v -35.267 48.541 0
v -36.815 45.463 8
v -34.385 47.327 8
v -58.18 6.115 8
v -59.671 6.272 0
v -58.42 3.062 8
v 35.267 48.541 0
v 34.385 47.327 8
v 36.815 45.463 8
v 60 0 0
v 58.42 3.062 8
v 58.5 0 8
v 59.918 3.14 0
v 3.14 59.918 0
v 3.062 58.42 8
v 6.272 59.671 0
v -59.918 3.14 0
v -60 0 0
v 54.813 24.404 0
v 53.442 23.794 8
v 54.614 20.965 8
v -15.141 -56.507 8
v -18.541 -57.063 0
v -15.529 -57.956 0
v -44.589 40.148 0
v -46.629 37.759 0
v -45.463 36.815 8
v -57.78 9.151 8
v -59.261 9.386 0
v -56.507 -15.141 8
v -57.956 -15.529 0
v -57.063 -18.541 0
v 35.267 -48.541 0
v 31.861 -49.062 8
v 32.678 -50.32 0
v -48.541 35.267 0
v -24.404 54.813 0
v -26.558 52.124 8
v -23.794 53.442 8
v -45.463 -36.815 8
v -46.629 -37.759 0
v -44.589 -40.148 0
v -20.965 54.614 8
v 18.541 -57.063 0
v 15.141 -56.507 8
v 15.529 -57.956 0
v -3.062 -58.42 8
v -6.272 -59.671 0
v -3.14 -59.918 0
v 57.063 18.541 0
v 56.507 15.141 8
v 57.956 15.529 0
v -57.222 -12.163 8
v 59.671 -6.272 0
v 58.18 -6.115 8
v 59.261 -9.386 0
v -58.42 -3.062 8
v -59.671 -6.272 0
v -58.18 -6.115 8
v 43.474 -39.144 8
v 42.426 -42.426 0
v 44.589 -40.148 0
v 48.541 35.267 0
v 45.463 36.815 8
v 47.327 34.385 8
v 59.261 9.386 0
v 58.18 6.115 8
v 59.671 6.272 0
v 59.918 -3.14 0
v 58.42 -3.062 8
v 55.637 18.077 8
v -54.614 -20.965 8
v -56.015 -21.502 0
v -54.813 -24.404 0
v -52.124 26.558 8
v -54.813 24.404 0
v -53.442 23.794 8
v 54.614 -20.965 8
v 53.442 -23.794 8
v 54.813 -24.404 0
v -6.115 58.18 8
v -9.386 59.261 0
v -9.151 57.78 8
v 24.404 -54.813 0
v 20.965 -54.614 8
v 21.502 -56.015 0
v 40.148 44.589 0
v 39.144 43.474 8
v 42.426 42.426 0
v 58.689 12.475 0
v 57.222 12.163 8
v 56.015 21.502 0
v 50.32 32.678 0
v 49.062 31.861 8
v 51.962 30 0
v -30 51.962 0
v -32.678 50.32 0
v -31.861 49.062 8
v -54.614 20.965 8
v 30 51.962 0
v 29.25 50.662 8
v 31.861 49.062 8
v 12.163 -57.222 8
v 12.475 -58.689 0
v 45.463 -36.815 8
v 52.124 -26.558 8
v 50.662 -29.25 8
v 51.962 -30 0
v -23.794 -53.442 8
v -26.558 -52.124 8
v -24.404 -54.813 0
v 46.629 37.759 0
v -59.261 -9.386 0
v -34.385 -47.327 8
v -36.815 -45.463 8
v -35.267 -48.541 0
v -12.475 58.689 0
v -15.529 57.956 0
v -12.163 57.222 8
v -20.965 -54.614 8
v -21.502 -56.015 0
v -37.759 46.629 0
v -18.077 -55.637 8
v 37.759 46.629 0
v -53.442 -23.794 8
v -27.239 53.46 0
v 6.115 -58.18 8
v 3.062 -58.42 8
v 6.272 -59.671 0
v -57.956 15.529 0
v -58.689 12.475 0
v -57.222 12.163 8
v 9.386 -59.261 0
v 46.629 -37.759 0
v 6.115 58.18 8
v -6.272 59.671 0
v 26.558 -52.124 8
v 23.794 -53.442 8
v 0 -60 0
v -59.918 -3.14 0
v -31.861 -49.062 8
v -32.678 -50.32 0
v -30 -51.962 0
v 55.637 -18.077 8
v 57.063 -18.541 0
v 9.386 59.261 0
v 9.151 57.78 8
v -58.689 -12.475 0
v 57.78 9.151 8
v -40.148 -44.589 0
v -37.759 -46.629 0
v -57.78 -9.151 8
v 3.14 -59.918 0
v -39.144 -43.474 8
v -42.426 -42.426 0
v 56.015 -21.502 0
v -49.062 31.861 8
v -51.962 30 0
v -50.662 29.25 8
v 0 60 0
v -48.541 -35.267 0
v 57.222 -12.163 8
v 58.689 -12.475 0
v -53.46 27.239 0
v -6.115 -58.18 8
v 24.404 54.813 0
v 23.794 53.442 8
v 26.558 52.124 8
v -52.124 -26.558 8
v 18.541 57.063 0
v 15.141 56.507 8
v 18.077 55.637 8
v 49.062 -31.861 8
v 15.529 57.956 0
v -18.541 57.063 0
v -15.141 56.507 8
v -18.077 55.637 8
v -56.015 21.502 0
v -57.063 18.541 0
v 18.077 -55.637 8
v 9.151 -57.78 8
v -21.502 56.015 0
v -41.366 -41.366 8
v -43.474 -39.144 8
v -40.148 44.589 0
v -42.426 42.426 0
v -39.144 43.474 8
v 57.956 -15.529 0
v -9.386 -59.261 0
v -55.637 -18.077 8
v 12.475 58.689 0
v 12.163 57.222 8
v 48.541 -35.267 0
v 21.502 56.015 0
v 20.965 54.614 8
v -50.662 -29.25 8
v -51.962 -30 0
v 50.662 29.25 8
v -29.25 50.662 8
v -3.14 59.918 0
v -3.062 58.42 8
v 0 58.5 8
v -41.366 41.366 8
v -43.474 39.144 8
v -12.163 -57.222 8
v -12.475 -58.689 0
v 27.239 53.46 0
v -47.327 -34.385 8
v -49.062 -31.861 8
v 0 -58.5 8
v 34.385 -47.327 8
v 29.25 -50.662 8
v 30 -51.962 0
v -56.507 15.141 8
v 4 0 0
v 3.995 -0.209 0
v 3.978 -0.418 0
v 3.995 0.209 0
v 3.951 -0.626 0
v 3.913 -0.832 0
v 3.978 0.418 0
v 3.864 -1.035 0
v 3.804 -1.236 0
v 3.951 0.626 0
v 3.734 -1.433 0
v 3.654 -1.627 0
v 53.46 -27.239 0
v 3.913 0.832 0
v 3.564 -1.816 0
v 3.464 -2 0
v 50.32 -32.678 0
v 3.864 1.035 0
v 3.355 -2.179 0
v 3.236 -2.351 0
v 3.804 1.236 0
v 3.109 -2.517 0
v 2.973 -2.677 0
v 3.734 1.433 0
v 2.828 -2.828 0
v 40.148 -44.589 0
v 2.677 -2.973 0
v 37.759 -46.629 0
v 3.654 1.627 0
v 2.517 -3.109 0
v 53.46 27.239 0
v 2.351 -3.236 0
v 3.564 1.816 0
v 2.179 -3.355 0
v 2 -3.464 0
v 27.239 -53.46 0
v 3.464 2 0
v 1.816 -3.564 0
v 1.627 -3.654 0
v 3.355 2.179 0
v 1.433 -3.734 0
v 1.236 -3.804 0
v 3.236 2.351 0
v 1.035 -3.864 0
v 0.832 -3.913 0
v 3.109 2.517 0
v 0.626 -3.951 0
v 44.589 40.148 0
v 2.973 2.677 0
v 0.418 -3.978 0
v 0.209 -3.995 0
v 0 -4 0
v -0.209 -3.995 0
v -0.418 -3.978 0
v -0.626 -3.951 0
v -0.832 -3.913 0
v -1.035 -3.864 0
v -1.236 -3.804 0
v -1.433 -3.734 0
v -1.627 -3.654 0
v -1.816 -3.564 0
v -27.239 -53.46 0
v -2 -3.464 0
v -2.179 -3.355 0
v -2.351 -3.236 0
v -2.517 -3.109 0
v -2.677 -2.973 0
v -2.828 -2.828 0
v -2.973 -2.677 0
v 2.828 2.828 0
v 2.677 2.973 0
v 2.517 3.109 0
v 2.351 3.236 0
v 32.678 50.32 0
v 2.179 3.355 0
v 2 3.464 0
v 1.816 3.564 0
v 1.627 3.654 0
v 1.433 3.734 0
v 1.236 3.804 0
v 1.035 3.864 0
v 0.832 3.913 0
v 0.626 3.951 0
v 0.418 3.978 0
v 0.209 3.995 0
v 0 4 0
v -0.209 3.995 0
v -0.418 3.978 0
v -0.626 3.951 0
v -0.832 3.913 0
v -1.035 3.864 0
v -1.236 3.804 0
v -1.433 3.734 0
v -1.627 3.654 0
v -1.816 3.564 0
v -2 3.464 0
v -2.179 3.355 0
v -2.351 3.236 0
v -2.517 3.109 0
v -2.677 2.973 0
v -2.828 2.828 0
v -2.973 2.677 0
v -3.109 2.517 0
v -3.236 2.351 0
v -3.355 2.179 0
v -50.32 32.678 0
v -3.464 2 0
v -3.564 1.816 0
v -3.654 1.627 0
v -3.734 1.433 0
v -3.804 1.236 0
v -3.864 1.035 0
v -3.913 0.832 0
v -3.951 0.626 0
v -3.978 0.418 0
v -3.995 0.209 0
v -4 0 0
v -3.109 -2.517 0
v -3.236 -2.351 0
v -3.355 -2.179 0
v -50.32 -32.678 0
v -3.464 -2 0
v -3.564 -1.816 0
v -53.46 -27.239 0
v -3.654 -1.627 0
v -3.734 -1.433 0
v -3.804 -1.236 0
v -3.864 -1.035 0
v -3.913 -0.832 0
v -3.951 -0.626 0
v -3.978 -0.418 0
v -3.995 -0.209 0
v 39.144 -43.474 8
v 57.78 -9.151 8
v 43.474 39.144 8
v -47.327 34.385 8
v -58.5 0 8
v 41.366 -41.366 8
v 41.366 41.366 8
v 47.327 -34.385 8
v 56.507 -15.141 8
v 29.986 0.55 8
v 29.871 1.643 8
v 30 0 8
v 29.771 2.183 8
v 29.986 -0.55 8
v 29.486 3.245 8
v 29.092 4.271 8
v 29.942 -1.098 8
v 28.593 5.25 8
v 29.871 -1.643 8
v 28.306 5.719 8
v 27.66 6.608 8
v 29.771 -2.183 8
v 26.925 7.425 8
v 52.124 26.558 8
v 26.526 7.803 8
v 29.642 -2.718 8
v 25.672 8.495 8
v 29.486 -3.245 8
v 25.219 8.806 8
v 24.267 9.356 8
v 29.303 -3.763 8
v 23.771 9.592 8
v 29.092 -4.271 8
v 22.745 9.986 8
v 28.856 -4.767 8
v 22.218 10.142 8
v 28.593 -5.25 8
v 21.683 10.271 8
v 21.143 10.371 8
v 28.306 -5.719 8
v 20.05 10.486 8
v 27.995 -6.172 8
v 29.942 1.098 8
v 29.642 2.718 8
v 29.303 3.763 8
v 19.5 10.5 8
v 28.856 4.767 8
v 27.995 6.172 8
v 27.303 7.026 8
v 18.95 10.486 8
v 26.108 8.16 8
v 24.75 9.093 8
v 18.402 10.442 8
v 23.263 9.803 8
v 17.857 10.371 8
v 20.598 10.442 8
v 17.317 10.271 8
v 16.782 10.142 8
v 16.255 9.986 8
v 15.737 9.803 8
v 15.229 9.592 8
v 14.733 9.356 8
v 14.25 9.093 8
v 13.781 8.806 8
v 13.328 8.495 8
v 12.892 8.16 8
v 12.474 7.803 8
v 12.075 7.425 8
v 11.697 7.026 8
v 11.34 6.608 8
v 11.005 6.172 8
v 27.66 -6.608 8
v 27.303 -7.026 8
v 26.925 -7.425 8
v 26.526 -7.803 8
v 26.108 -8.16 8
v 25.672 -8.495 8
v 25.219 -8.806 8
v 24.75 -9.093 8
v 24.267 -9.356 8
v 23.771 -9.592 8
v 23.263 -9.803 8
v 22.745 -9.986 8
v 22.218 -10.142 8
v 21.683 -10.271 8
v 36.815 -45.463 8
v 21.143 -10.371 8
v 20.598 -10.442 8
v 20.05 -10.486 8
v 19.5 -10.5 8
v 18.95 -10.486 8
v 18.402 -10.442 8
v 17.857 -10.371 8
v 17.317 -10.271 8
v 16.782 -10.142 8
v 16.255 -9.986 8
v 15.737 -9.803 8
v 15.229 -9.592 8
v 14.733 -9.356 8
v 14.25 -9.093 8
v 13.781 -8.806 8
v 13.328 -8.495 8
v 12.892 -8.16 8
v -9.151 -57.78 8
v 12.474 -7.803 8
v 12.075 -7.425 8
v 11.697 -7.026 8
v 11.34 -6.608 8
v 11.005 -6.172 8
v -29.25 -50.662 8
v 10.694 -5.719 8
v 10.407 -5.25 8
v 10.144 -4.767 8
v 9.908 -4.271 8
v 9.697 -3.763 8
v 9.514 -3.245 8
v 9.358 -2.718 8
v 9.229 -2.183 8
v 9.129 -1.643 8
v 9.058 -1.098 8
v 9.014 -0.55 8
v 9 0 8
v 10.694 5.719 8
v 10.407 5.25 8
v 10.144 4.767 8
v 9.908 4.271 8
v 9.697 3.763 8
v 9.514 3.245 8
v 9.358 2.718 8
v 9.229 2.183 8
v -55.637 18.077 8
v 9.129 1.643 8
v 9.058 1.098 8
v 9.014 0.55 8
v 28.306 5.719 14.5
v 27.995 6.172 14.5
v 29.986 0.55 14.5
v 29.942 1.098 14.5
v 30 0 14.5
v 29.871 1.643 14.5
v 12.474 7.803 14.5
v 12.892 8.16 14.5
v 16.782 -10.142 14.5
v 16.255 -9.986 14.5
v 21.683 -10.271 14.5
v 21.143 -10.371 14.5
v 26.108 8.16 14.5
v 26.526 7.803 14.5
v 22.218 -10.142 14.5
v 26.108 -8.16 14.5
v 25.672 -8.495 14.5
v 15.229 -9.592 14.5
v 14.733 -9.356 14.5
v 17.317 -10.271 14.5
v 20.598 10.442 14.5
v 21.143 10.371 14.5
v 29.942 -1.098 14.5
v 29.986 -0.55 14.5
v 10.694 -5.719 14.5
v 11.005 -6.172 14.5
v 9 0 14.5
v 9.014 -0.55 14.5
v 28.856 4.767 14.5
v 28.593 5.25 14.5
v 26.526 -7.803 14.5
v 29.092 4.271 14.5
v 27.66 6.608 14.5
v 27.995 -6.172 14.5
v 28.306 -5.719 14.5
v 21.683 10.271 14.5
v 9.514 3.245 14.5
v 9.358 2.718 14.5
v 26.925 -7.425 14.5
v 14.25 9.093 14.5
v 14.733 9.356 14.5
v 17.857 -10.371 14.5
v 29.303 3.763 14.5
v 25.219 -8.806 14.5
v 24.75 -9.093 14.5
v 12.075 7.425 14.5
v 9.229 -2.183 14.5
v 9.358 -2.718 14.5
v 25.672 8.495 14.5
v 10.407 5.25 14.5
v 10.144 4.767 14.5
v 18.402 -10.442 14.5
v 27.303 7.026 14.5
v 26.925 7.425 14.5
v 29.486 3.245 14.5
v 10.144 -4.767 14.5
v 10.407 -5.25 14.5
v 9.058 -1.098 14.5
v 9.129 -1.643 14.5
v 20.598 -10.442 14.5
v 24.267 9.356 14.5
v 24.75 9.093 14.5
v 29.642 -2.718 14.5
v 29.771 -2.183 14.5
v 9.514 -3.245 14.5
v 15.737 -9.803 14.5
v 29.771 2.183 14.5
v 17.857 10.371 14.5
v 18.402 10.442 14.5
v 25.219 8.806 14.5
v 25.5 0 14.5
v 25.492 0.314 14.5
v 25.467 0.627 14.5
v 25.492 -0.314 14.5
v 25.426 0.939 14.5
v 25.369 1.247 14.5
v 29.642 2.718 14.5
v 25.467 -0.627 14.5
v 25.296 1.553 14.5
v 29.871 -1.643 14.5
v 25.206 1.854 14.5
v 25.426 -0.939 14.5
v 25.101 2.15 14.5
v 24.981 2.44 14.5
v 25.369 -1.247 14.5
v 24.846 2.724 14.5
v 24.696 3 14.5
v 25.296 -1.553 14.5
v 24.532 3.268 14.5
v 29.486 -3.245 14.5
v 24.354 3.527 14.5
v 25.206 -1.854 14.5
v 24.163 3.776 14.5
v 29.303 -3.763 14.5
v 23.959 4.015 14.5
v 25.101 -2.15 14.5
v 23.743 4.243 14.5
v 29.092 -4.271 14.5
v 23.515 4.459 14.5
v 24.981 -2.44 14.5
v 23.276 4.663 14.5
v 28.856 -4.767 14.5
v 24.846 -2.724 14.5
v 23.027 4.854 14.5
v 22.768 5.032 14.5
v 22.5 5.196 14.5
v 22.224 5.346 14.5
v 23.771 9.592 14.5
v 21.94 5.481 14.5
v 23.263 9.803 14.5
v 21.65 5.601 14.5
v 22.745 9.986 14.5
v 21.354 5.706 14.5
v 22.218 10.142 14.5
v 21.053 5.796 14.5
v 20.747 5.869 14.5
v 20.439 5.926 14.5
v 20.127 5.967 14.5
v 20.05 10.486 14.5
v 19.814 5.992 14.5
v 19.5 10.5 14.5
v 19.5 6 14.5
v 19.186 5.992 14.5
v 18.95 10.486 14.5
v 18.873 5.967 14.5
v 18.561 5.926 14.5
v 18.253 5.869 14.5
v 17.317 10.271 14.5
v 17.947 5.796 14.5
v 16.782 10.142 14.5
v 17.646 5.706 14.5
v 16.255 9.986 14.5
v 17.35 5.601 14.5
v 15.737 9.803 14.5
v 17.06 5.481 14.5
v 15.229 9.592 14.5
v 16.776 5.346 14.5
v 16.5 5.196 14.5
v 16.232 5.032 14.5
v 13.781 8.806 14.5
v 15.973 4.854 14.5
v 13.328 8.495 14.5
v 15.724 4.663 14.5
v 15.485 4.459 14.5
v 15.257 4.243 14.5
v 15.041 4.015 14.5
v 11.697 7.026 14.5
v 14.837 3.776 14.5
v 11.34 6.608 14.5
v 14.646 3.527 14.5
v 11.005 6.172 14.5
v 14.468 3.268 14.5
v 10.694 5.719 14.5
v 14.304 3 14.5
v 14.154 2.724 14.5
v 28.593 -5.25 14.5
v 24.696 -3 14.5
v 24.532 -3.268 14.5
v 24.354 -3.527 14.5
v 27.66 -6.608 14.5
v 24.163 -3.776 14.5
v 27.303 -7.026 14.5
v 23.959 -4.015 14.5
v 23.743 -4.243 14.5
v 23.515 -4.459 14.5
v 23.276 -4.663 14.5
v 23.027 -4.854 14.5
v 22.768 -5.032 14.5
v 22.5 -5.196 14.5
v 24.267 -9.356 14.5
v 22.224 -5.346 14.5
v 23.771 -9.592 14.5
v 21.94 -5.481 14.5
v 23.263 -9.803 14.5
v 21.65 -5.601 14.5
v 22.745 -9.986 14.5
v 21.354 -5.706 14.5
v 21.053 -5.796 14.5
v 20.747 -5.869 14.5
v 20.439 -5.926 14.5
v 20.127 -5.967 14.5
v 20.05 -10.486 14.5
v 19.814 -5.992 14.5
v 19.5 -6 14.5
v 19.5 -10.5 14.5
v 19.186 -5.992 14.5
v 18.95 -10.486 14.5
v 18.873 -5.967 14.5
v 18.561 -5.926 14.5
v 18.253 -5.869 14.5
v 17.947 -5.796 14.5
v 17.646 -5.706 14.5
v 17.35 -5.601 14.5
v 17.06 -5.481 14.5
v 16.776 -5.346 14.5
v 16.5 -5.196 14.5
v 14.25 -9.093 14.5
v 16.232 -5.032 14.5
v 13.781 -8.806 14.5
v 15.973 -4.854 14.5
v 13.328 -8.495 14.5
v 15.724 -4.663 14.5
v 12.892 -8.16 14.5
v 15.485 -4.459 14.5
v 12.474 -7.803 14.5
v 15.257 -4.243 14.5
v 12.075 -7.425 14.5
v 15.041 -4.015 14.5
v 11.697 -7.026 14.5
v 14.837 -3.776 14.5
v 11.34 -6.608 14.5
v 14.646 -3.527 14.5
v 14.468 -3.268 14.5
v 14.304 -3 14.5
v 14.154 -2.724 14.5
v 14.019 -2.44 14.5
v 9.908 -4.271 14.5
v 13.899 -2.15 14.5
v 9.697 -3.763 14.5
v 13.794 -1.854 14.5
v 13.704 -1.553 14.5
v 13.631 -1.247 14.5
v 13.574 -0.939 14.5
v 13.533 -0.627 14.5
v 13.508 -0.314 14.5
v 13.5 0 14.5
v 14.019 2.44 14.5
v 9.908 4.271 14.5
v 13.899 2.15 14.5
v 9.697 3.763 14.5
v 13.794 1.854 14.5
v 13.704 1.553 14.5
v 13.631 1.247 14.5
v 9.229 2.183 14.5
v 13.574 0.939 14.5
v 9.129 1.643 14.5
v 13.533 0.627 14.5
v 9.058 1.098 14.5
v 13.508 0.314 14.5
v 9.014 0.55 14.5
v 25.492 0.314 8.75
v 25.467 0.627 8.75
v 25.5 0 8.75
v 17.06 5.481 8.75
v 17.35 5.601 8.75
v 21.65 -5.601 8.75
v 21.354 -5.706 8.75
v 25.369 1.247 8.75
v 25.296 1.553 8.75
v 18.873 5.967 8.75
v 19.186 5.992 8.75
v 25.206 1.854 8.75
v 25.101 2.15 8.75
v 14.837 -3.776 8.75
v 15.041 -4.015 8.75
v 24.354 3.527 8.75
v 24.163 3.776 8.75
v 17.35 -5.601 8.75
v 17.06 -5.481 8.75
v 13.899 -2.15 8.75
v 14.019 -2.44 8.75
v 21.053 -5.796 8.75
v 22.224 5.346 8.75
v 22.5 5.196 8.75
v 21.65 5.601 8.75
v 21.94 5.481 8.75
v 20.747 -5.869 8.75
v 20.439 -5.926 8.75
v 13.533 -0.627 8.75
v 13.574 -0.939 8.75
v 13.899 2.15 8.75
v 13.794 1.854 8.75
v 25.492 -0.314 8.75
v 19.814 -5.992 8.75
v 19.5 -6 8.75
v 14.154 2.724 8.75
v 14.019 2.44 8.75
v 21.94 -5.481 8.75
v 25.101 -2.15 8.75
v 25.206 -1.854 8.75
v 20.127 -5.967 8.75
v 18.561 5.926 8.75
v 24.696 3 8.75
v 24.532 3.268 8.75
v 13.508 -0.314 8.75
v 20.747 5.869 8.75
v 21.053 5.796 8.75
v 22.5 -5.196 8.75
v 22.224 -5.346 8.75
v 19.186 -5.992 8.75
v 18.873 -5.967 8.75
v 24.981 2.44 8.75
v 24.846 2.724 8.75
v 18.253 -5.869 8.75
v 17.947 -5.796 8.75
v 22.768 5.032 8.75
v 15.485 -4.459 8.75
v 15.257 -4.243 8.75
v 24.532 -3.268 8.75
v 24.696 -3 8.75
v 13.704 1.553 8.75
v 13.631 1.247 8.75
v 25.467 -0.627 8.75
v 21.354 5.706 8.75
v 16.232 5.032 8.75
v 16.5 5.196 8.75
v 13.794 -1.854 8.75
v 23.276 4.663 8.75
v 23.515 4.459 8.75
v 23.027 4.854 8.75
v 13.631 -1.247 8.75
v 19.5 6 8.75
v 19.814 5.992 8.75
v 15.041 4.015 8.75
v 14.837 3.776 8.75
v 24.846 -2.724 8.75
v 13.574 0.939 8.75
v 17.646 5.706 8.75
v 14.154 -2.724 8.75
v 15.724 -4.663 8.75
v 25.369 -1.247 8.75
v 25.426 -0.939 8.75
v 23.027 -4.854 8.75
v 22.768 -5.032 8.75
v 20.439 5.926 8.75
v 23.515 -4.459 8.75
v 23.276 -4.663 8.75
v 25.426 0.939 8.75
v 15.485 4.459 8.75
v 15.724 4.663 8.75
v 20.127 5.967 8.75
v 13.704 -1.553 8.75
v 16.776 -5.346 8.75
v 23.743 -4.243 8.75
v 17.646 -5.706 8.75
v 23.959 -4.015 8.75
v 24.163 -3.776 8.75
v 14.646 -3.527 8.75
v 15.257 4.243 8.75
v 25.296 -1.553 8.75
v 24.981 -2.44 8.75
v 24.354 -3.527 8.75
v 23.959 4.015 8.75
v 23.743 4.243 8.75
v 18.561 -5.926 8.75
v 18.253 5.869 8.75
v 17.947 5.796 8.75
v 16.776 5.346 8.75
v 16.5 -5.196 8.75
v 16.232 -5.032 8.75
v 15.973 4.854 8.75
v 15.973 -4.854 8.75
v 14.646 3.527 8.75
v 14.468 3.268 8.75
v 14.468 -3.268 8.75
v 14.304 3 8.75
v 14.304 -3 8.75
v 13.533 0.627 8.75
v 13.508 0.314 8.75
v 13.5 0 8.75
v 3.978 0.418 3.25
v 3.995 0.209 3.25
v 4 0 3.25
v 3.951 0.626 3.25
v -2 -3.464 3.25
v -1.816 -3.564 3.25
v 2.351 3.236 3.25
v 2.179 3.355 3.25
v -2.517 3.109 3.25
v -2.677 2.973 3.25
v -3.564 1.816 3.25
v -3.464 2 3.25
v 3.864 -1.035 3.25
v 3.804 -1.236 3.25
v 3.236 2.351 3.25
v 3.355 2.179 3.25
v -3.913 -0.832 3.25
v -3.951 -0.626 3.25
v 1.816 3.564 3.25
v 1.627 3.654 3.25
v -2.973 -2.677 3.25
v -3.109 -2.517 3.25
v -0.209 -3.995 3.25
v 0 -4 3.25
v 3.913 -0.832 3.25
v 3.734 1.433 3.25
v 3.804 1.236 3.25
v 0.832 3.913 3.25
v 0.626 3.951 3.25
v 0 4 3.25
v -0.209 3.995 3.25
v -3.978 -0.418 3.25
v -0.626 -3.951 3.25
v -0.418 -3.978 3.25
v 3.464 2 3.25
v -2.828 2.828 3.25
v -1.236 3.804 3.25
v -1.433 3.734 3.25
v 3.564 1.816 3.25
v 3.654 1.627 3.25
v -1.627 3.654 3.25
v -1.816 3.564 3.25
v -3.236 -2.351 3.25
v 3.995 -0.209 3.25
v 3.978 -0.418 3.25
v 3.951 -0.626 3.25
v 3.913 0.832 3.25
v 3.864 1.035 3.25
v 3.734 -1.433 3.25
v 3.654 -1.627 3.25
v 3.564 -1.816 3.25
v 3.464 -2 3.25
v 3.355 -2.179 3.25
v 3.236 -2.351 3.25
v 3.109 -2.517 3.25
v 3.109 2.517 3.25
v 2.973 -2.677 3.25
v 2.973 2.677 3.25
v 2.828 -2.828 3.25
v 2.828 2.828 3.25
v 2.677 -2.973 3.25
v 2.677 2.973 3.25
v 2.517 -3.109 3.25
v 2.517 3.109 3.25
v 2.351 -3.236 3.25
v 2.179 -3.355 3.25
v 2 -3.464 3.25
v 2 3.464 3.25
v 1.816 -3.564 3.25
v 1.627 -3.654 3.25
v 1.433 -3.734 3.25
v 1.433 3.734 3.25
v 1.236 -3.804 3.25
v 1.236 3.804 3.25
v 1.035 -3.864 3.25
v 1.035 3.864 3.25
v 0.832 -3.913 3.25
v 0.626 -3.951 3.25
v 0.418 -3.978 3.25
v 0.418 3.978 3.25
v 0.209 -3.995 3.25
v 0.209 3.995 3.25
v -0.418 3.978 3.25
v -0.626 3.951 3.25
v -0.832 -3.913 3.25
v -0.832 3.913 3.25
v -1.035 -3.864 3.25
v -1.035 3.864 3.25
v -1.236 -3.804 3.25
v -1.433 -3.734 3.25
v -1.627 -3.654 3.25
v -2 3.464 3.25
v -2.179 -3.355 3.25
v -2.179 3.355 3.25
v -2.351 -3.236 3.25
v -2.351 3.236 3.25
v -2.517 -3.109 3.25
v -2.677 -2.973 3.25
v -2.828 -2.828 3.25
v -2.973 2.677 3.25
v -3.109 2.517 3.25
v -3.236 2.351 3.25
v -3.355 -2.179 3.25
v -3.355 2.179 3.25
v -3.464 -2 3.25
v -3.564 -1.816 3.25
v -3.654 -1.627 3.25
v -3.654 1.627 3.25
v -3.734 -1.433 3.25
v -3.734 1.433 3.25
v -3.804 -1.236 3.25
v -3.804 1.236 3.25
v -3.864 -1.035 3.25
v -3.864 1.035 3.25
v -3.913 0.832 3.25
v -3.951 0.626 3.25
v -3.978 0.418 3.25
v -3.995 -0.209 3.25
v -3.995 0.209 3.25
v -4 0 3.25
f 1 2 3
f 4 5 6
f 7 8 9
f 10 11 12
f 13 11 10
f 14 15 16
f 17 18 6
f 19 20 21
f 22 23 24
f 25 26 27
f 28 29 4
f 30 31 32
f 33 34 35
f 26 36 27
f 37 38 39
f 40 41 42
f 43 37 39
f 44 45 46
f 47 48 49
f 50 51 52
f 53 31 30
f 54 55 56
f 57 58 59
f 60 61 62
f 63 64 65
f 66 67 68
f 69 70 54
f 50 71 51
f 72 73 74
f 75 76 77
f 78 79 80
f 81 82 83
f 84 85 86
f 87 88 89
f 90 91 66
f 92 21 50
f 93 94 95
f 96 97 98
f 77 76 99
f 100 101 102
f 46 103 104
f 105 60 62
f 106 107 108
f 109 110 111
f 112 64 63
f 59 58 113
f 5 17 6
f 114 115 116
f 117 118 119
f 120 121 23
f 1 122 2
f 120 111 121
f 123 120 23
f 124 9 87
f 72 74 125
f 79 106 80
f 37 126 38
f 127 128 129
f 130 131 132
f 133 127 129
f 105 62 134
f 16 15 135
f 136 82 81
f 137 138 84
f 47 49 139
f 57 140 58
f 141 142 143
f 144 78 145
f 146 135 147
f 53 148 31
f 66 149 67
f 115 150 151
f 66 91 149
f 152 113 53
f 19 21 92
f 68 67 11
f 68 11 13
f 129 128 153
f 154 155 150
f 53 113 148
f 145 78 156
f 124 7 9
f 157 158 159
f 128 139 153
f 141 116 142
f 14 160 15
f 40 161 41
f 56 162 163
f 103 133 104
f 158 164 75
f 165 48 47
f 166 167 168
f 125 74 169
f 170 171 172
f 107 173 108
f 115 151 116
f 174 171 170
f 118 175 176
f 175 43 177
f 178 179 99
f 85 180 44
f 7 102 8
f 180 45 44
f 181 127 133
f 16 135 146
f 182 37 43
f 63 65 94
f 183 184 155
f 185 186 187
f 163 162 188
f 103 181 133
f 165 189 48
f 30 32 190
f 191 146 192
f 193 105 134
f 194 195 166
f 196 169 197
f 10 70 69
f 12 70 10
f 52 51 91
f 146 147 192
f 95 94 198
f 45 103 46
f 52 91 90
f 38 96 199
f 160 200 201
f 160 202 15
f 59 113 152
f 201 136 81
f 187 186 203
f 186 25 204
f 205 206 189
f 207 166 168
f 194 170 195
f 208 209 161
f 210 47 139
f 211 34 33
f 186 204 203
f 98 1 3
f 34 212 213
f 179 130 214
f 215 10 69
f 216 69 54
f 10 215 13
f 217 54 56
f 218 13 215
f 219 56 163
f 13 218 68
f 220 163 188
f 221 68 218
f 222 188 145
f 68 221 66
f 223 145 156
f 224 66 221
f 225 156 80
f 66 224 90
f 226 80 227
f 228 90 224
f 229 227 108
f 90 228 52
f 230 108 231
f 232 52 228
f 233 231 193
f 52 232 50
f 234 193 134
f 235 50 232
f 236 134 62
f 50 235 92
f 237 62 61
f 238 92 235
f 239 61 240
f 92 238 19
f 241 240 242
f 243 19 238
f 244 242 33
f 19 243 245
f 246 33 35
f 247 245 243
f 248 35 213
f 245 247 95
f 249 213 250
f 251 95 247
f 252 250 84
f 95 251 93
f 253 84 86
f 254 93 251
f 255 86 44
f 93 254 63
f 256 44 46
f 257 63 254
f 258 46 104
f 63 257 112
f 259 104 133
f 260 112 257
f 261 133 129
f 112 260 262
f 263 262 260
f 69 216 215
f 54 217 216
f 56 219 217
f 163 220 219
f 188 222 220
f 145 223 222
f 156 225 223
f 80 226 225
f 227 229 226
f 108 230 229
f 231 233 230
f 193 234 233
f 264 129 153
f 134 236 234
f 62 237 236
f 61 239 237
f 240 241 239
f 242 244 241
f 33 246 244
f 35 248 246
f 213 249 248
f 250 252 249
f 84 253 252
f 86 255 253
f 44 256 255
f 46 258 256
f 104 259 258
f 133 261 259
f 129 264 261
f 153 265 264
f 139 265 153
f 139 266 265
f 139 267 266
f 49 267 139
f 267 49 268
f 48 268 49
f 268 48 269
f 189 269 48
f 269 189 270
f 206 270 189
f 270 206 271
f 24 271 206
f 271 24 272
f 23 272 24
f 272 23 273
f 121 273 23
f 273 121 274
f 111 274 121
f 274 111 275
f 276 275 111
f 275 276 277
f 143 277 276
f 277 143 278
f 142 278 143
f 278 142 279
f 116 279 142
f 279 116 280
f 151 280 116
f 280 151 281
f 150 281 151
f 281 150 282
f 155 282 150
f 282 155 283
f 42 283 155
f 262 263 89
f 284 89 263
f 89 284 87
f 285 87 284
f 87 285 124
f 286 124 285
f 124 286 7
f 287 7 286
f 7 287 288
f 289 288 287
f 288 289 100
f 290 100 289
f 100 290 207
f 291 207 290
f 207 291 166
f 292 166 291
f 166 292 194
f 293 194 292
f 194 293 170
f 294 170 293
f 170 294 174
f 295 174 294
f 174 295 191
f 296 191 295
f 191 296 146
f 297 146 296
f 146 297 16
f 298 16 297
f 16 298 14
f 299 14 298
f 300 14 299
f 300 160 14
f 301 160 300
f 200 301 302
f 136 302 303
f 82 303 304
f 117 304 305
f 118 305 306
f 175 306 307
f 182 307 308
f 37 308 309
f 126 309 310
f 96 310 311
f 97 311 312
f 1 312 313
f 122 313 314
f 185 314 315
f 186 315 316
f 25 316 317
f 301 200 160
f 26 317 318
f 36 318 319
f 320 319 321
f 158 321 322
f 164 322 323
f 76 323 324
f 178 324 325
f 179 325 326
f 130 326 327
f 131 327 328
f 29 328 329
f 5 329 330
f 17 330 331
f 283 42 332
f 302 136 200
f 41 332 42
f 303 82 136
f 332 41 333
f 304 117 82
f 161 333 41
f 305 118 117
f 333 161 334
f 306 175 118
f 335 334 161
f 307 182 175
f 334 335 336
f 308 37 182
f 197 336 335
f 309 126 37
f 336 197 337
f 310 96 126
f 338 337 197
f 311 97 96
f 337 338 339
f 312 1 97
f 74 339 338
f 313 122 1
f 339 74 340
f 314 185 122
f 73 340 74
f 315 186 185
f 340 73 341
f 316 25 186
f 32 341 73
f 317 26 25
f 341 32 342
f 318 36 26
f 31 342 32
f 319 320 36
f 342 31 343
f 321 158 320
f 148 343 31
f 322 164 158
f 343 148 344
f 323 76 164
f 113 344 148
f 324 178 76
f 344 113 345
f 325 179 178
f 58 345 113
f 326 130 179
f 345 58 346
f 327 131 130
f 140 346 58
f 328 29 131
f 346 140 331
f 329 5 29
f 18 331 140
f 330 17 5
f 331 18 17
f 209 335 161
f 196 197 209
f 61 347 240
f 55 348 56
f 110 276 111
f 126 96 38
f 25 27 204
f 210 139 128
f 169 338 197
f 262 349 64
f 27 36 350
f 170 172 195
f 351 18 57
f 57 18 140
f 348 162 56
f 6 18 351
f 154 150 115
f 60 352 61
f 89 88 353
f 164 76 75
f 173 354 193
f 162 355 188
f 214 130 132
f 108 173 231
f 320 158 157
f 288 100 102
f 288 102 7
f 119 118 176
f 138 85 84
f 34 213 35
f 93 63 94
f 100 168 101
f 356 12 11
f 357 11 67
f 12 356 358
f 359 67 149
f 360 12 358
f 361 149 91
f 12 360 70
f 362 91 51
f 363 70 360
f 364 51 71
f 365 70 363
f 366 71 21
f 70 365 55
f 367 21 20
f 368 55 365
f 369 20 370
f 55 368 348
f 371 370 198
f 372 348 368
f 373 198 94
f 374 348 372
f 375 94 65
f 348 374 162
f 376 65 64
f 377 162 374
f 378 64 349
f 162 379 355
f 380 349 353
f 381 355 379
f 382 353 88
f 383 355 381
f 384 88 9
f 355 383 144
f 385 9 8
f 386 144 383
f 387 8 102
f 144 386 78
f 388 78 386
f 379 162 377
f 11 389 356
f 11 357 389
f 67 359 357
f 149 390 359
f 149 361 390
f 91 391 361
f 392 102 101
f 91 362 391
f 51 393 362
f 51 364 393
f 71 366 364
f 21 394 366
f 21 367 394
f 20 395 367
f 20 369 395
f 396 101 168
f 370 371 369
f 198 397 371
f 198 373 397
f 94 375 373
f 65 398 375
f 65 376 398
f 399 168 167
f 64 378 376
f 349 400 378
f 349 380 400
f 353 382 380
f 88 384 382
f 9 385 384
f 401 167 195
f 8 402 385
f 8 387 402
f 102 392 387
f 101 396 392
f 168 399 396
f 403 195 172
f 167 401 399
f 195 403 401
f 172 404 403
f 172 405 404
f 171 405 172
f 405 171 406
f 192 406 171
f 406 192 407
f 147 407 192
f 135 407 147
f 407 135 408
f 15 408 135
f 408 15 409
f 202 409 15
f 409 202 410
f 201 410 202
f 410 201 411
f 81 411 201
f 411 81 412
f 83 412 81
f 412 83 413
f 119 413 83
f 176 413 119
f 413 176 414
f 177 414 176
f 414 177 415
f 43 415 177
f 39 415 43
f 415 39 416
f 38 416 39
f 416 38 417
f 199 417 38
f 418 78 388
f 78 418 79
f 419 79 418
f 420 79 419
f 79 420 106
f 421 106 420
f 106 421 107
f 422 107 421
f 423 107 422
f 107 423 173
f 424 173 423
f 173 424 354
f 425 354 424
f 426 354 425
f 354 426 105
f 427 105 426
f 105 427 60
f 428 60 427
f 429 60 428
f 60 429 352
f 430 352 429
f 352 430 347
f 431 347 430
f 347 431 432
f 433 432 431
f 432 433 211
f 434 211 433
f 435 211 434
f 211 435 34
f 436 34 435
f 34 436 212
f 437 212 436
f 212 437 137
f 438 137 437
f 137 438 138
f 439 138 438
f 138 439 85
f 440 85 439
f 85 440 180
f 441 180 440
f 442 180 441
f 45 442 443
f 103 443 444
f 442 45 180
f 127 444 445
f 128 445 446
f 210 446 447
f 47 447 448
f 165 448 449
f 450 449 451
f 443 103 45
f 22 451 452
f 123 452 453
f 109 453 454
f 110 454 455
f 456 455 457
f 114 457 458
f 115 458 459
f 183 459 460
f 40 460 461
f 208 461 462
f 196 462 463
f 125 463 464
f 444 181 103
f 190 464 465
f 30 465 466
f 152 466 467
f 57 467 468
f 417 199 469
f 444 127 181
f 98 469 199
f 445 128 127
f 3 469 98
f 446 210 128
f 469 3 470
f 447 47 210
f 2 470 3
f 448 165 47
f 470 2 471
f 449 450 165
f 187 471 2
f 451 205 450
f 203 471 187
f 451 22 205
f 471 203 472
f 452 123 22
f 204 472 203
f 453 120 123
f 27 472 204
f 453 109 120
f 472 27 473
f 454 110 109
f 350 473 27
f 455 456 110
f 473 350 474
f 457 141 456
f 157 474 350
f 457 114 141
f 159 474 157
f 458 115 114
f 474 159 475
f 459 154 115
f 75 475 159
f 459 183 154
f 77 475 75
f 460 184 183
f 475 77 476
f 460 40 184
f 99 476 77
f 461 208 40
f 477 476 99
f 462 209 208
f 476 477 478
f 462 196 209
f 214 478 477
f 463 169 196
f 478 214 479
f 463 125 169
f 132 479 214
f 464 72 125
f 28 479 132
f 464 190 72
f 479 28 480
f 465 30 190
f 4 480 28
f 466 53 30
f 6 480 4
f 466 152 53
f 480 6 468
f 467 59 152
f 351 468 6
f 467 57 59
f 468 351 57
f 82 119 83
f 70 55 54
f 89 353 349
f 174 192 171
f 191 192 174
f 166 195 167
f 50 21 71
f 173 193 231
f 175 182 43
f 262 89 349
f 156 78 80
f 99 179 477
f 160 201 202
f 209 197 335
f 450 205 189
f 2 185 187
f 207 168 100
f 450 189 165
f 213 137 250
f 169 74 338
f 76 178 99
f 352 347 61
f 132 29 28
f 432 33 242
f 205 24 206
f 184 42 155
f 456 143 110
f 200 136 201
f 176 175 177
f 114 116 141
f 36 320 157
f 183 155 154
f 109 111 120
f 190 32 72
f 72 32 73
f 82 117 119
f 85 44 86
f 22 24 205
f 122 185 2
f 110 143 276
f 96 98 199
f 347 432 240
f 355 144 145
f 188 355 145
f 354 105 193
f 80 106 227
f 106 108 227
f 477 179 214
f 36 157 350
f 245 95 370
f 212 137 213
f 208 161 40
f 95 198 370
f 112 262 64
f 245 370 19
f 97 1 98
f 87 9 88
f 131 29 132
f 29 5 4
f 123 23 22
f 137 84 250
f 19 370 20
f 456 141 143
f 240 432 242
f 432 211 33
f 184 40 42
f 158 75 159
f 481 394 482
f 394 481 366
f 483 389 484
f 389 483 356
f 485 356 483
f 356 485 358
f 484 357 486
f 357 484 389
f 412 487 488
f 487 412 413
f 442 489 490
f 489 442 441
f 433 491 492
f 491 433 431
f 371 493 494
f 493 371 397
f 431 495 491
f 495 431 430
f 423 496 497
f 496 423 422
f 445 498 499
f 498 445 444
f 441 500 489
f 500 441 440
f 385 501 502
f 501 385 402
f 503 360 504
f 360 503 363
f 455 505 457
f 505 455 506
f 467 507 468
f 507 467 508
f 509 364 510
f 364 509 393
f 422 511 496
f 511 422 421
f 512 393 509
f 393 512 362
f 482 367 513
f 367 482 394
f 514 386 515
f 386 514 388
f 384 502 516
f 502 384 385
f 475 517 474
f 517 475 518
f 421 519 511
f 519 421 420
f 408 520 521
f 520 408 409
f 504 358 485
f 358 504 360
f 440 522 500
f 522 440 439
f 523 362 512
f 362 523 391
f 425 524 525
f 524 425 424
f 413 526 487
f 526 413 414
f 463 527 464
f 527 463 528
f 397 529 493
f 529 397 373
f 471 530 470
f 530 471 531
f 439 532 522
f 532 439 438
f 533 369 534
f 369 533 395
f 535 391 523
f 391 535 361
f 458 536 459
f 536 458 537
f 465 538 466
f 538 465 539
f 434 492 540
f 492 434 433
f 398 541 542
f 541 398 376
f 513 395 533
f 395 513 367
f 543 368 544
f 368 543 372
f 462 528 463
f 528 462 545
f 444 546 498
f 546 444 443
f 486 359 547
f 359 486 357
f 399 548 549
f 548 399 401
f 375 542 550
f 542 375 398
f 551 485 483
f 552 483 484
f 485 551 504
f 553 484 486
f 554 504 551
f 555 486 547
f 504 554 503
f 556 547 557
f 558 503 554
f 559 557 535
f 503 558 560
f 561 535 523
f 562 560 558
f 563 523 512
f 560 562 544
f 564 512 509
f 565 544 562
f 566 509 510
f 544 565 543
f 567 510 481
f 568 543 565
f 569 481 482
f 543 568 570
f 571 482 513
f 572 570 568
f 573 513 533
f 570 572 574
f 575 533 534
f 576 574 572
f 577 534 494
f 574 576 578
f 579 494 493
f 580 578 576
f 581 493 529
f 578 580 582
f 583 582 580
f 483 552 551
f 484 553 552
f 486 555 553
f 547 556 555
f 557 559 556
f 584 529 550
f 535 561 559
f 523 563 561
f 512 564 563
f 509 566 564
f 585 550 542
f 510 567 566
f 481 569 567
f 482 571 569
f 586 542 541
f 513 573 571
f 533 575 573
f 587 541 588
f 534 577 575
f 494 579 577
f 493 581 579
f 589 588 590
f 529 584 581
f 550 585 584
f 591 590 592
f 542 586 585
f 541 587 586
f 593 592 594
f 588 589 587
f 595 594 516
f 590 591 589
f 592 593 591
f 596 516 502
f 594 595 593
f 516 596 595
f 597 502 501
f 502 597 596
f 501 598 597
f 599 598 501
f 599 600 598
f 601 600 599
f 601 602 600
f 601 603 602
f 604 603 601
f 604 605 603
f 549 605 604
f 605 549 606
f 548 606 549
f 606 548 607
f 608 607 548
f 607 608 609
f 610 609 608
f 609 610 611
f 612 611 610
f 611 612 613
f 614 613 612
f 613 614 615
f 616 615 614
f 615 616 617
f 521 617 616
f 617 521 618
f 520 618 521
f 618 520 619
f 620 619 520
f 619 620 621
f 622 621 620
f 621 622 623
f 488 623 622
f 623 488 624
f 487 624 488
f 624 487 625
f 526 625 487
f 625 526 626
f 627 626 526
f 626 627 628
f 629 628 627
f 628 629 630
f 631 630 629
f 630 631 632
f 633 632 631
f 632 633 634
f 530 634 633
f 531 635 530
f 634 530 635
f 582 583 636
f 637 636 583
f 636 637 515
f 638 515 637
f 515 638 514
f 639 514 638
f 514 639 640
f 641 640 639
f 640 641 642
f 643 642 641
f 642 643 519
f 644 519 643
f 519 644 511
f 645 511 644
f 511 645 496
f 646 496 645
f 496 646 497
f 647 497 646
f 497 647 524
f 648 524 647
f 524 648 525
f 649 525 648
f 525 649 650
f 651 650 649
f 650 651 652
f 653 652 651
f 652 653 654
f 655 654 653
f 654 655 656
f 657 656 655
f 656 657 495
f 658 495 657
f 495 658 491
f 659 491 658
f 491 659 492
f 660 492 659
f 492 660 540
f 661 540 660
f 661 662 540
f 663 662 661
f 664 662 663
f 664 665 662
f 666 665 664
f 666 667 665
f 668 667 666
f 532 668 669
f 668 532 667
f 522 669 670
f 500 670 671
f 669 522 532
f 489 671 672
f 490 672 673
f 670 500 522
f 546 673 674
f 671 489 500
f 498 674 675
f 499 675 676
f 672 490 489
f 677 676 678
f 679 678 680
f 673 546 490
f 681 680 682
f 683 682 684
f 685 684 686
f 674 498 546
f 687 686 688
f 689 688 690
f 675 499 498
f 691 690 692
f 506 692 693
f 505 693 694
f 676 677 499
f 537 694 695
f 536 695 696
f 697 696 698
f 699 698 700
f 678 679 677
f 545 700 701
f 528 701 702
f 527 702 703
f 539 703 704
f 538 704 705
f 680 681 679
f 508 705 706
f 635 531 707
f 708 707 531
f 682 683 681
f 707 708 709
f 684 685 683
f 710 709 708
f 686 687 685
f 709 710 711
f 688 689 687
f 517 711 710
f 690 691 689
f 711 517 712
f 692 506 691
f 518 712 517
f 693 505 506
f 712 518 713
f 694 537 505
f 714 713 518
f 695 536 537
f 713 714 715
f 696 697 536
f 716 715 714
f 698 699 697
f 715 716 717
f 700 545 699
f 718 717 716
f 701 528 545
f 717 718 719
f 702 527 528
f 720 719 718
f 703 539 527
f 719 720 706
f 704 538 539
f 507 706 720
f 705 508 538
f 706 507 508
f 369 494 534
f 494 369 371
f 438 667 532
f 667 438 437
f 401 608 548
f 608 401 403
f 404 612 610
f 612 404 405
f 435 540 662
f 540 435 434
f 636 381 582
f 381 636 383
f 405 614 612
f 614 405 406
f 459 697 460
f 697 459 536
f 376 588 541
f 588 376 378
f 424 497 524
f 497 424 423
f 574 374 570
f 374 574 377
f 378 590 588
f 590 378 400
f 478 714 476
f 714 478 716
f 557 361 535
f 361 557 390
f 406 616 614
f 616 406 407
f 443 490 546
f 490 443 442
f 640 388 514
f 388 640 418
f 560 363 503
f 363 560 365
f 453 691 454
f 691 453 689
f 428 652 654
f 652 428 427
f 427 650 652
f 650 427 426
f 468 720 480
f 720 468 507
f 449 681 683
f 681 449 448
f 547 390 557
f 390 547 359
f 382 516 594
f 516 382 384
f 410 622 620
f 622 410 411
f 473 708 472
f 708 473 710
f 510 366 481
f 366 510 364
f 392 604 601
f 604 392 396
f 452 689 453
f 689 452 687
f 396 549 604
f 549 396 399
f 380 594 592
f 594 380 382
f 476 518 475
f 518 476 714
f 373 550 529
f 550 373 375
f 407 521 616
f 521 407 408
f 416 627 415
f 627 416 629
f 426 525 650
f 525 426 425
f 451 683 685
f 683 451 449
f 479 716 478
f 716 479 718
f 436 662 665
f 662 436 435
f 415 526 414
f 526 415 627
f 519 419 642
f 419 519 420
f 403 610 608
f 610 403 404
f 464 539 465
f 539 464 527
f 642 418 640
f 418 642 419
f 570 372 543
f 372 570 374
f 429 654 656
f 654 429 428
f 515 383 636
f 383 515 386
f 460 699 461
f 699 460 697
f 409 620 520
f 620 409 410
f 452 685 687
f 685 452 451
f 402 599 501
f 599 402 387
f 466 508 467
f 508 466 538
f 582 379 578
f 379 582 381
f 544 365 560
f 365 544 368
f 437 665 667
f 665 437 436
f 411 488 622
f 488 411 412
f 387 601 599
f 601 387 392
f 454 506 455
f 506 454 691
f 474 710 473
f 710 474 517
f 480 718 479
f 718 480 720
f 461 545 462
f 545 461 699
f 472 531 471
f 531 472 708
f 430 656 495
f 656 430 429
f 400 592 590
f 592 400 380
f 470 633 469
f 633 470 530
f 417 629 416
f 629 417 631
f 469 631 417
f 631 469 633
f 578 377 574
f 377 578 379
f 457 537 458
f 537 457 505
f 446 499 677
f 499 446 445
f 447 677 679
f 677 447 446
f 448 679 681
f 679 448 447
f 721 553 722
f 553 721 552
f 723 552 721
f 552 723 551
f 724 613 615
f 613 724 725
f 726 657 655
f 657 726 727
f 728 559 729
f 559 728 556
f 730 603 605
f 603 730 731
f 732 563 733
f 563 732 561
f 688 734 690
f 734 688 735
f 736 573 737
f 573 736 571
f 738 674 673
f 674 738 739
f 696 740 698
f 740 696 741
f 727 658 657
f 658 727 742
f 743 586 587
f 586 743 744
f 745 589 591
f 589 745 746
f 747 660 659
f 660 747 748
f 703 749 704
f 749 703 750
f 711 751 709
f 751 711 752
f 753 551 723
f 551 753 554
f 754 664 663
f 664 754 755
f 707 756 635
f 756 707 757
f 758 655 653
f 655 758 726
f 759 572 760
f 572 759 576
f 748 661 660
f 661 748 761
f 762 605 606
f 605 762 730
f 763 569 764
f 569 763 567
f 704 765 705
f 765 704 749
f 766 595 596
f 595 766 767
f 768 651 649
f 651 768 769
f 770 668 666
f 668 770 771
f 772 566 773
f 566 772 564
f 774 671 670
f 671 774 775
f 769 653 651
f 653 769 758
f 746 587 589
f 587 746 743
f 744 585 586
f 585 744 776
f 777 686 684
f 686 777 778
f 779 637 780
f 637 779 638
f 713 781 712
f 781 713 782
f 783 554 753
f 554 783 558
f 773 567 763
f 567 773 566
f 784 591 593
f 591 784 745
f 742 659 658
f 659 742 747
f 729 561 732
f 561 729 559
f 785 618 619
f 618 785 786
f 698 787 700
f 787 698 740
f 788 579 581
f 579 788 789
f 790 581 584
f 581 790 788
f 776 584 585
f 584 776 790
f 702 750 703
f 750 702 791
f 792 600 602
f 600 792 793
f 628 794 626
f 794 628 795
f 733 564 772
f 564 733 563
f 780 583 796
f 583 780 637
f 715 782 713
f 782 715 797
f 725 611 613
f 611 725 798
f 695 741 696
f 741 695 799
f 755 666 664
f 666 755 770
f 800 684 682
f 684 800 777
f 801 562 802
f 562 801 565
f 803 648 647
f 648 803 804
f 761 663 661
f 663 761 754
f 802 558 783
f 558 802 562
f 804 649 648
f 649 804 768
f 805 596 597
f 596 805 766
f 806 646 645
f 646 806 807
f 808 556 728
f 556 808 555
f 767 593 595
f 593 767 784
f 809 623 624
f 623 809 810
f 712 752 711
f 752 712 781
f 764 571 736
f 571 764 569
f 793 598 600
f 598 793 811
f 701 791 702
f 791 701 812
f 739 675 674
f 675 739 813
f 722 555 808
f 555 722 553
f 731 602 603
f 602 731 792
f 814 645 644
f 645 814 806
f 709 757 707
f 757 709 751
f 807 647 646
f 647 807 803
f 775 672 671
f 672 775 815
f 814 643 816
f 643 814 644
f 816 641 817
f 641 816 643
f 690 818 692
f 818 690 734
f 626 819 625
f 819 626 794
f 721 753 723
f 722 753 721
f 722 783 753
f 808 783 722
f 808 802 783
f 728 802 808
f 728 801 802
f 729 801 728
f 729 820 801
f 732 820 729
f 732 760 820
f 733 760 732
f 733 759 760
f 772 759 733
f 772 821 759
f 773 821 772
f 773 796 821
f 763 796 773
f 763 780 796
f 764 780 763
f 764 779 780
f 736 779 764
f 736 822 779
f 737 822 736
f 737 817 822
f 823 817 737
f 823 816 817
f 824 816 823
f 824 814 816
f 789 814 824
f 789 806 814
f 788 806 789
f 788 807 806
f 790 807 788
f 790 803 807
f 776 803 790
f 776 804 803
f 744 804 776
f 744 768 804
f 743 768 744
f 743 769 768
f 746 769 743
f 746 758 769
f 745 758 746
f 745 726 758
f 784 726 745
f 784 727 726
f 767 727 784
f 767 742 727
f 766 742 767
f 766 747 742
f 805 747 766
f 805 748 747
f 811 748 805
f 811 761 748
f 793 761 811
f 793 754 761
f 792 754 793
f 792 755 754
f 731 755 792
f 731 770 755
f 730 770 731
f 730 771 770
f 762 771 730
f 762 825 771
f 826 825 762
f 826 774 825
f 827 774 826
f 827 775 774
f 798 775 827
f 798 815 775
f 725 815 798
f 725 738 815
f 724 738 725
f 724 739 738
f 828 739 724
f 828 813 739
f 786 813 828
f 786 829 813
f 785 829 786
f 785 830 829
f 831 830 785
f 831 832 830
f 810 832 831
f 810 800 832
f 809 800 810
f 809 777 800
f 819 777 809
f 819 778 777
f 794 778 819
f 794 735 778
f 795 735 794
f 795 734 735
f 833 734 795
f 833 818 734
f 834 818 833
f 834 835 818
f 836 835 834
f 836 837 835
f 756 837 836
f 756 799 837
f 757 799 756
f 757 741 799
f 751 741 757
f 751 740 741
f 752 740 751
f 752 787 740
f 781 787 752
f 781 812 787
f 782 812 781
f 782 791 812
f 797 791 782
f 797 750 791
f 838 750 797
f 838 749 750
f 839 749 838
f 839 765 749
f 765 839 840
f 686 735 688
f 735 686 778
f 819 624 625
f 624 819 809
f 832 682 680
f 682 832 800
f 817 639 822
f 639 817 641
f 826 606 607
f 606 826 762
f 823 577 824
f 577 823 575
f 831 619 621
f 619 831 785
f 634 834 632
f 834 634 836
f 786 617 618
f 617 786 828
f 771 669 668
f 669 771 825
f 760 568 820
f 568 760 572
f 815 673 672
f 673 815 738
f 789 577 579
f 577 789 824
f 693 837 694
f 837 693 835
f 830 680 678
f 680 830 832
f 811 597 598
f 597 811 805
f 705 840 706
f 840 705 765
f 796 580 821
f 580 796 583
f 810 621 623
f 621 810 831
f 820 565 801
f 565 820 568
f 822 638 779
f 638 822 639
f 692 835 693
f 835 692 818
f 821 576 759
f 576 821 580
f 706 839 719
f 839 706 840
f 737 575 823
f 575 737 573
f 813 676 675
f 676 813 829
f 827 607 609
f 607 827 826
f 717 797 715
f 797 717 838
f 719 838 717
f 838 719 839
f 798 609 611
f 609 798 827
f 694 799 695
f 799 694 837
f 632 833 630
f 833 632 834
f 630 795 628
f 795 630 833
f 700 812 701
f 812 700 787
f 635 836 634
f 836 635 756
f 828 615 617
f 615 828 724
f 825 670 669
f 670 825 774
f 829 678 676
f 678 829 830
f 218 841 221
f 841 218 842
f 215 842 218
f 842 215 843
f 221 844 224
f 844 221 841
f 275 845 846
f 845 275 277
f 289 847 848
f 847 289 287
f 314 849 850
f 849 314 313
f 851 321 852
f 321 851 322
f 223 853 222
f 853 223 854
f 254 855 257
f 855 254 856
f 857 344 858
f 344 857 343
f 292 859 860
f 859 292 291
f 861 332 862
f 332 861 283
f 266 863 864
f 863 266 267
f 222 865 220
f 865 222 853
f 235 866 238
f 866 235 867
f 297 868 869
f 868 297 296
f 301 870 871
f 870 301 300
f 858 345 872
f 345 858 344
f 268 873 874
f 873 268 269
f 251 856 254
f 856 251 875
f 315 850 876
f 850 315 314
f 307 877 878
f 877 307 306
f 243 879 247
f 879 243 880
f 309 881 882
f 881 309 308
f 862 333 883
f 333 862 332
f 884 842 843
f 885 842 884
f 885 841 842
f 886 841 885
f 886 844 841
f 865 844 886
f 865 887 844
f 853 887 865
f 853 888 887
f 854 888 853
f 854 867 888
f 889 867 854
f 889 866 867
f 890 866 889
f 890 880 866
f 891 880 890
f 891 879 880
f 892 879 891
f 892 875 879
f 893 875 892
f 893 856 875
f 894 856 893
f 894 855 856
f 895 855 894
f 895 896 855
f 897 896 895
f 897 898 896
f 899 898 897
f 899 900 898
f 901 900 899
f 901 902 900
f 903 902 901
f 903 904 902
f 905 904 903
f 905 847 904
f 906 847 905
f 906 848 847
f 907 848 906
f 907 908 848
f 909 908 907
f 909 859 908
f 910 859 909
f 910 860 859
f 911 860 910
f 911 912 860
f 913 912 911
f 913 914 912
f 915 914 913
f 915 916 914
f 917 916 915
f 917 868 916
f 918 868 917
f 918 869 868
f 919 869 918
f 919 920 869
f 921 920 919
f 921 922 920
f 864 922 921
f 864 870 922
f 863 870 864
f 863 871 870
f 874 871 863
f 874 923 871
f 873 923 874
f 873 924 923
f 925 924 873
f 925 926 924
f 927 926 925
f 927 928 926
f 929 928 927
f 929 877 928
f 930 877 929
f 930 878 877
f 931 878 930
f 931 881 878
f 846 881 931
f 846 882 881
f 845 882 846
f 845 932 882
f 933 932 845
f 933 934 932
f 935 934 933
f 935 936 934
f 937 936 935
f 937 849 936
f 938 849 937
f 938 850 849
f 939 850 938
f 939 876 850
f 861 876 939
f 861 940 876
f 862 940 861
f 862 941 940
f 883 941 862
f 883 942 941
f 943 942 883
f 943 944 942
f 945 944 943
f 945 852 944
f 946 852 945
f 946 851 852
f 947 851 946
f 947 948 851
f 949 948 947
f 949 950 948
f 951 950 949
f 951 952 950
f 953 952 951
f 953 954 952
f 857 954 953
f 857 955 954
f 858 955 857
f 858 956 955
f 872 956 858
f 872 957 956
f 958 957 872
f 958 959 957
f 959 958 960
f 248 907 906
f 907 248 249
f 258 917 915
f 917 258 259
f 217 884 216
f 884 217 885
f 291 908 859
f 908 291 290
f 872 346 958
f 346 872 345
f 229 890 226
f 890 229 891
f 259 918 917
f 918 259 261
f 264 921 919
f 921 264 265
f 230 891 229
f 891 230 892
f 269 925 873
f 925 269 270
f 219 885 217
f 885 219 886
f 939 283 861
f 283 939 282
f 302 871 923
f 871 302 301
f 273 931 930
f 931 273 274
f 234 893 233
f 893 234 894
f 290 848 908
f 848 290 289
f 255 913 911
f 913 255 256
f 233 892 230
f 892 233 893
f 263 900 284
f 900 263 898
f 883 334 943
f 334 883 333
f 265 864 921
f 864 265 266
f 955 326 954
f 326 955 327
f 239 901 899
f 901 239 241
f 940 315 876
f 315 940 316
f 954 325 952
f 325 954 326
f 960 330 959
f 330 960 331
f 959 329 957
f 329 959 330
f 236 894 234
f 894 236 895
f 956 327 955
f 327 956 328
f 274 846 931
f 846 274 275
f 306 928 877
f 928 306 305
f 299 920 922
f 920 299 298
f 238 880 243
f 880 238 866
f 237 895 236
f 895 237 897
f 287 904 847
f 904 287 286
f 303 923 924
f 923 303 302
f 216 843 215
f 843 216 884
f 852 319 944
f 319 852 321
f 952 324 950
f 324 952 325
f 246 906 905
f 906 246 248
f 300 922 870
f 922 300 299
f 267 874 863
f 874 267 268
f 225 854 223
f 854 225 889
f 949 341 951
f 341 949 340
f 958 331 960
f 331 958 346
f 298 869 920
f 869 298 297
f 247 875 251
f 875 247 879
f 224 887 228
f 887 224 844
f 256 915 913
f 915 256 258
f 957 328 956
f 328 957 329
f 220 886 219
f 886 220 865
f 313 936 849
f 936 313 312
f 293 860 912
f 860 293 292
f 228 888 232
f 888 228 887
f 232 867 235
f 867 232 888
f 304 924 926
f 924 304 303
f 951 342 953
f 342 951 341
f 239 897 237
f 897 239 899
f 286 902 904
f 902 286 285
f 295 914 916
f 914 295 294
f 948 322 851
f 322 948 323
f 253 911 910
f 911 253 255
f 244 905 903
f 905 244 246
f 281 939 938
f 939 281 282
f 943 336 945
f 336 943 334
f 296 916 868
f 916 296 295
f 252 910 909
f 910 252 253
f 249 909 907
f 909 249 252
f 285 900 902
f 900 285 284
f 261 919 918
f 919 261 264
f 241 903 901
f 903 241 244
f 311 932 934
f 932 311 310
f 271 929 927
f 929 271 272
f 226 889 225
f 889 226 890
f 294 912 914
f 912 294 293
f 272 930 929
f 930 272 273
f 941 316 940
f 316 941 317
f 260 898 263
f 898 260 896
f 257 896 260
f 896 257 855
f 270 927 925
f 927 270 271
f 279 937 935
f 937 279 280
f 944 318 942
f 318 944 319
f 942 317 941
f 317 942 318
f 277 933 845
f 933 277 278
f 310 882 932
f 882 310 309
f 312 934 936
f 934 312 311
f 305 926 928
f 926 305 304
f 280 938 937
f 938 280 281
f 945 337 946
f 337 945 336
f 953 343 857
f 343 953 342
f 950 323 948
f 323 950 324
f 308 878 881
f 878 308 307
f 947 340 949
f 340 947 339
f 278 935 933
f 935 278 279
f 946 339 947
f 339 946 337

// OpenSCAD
hole_h = 5.75;
hole_r = 6;

riser_h = 6.5;
outter_r = hole_r * 1.75;

base_h = 8;
base_bottom_r = 60;
base_top_r = base_bottom_r - 1.5;

magnet_h = 3.25;
magnet_r = 4;

roundness = 120;

difference() {
    union() {
        cylinder(h = base_h, r1 = base_bottom_r, r2 = base_top_r, $fn = roundness);

        translate([(base_top_r / 3), 0, base_h]) {
            cylinder(h = riser_h, r = outter_r, $fn = roundness);
        }
    }
    
    translate([(base_top_r / 3), 0, ((base_h + riser_h) - hole_h)]) {
        cylinder(h = hole_h, r = hole_r, $fn = roundness);
    }
    
    cylinder(h = magnet_h, r = magnet_r, $fn = roundness);
}
